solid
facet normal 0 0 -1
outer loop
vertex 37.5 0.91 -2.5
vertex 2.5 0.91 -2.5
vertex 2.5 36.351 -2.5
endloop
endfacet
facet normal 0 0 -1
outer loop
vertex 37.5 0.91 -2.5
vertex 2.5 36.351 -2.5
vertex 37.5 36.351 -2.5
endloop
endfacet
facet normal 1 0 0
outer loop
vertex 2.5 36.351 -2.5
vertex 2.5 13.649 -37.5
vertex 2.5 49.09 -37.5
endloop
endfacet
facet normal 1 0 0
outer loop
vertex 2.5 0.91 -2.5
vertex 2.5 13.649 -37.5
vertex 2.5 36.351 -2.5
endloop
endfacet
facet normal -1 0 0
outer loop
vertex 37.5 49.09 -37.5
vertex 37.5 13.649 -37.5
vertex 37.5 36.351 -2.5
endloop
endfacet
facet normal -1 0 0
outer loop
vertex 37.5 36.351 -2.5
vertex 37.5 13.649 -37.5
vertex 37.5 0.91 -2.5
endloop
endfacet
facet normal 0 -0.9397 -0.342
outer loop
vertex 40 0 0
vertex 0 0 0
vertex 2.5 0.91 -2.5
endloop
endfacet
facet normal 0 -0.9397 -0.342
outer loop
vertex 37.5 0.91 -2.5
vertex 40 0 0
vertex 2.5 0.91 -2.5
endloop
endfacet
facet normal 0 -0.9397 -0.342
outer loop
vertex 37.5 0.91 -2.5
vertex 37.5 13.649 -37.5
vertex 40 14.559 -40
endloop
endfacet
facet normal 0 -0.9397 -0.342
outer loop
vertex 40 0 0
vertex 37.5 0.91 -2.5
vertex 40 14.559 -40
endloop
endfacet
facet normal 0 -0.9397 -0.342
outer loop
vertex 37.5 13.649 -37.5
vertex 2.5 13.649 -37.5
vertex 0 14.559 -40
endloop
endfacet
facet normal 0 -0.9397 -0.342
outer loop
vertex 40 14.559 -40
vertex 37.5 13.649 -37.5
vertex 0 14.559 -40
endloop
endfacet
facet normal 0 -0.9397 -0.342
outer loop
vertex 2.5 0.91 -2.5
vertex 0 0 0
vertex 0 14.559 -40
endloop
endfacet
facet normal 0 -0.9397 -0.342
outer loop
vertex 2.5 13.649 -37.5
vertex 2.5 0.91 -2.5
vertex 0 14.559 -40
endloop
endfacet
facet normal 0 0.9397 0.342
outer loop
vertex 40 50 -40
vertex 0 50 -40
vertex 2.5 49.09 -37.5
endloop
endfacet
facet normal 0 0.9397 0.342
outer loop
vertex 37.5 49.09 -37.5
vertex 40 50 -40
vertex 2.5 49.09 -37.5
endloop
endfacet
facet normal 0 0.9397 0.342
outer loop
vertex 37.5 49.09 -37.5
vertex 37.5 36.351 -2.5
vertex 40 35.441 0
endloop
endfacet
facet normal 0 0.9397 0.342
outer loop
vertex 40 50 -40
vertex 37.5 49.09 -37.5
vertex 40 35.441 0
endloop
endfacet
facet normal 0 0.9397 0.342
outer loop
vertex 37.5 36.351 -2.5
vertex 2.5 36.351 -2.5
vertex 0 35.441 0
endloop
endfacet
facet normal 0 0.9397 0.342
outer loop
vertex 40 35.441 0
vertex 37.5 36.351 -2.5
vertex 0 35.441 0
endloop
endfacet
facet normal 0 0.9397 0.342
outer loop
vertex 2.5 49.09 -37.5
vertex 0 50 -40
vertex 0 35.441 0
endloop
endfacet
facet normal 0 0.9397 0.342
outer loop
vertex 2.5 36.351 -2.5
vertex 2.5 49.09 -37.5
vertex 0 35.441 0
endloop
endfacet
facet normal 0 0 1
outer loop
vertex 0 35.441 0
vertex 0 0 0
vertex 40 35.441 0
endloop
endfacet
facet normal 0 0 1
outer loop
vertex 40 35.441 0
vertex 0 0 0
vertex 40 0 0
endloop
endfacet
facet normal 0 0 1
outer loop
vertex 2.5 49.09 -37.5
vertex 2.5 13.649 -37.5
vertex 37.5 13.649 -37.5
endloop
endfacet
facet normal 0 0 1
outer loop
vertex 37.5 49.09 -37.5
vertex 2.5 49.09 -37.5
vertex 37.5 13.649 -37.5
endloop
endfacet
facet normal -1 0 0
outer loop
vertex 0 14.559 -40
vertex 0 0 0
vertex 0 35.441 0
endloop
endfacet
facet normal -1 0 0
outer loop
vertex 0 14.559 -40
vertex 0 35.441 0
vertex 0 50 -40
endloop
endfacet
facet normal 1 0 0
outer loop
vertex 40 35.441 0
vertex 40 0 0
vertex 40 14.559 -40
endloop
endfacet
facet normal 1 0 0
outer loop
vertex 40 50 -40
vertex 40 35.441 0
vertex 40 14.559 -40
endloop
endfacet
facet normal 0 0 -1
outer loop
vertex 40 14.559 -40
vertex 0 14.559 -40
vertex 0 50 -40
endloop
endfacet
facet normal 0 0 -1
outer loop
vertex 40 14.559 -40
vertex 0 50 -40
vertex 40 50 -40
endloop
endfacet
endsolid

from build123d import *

# Parameters (mm, degrees)
SKETCH1_W           = 40
SKETCH1_H           = 40
BOSS_EXTRUDE1_DEPTH = 50
SKETCH2_W           = 35
SKETCH2_H           = 35
CUT_EXTRUDE1_DEPTH  = 76.498344353
CUT_EXTRUDE2_DEPTH  = 76.498344353


with BuildPart() as part:
    # Sketch1 → Boss-Extrude1 (new body)
    with BuildSketch(Plane(origin=(0, 0, 0), x_dir=(1, 0, 0), z_dir=(0, 1, 0))):
        with Locations((20, 20)):
            Rectangle(SKETCH1_W, SKETCH1_H)
    extrude(amount=BOSS_EXTRUDE1_DEPTH)

    # Sketch2 → Cut-Extrude1 (cut, through all)
    with BuildSketch(Plane.XZ):
        with Locations((20, -20)):
            Rectangle(SKETCH2_W, SKETCH2_H)
    extrude(amount=-CUT_EXTRUDE1_DEPTH, mode=Mode.SUBTRACT)

    # Sketch3 → Cut-Extrude2 (cut, through all)
    with BuildSketch(Plane.ZY):
        Polygon((-40, 0), (0, 0), (-40, 14.558809371), align=None)
        Polygon((-40, 50), (0, 35.441190629), (0, 50), align=None)
    extrude(amount=-CUT_EXTRUDE2_DEPTH, mode=Mode.SUBTRACT)


solid = part.part
